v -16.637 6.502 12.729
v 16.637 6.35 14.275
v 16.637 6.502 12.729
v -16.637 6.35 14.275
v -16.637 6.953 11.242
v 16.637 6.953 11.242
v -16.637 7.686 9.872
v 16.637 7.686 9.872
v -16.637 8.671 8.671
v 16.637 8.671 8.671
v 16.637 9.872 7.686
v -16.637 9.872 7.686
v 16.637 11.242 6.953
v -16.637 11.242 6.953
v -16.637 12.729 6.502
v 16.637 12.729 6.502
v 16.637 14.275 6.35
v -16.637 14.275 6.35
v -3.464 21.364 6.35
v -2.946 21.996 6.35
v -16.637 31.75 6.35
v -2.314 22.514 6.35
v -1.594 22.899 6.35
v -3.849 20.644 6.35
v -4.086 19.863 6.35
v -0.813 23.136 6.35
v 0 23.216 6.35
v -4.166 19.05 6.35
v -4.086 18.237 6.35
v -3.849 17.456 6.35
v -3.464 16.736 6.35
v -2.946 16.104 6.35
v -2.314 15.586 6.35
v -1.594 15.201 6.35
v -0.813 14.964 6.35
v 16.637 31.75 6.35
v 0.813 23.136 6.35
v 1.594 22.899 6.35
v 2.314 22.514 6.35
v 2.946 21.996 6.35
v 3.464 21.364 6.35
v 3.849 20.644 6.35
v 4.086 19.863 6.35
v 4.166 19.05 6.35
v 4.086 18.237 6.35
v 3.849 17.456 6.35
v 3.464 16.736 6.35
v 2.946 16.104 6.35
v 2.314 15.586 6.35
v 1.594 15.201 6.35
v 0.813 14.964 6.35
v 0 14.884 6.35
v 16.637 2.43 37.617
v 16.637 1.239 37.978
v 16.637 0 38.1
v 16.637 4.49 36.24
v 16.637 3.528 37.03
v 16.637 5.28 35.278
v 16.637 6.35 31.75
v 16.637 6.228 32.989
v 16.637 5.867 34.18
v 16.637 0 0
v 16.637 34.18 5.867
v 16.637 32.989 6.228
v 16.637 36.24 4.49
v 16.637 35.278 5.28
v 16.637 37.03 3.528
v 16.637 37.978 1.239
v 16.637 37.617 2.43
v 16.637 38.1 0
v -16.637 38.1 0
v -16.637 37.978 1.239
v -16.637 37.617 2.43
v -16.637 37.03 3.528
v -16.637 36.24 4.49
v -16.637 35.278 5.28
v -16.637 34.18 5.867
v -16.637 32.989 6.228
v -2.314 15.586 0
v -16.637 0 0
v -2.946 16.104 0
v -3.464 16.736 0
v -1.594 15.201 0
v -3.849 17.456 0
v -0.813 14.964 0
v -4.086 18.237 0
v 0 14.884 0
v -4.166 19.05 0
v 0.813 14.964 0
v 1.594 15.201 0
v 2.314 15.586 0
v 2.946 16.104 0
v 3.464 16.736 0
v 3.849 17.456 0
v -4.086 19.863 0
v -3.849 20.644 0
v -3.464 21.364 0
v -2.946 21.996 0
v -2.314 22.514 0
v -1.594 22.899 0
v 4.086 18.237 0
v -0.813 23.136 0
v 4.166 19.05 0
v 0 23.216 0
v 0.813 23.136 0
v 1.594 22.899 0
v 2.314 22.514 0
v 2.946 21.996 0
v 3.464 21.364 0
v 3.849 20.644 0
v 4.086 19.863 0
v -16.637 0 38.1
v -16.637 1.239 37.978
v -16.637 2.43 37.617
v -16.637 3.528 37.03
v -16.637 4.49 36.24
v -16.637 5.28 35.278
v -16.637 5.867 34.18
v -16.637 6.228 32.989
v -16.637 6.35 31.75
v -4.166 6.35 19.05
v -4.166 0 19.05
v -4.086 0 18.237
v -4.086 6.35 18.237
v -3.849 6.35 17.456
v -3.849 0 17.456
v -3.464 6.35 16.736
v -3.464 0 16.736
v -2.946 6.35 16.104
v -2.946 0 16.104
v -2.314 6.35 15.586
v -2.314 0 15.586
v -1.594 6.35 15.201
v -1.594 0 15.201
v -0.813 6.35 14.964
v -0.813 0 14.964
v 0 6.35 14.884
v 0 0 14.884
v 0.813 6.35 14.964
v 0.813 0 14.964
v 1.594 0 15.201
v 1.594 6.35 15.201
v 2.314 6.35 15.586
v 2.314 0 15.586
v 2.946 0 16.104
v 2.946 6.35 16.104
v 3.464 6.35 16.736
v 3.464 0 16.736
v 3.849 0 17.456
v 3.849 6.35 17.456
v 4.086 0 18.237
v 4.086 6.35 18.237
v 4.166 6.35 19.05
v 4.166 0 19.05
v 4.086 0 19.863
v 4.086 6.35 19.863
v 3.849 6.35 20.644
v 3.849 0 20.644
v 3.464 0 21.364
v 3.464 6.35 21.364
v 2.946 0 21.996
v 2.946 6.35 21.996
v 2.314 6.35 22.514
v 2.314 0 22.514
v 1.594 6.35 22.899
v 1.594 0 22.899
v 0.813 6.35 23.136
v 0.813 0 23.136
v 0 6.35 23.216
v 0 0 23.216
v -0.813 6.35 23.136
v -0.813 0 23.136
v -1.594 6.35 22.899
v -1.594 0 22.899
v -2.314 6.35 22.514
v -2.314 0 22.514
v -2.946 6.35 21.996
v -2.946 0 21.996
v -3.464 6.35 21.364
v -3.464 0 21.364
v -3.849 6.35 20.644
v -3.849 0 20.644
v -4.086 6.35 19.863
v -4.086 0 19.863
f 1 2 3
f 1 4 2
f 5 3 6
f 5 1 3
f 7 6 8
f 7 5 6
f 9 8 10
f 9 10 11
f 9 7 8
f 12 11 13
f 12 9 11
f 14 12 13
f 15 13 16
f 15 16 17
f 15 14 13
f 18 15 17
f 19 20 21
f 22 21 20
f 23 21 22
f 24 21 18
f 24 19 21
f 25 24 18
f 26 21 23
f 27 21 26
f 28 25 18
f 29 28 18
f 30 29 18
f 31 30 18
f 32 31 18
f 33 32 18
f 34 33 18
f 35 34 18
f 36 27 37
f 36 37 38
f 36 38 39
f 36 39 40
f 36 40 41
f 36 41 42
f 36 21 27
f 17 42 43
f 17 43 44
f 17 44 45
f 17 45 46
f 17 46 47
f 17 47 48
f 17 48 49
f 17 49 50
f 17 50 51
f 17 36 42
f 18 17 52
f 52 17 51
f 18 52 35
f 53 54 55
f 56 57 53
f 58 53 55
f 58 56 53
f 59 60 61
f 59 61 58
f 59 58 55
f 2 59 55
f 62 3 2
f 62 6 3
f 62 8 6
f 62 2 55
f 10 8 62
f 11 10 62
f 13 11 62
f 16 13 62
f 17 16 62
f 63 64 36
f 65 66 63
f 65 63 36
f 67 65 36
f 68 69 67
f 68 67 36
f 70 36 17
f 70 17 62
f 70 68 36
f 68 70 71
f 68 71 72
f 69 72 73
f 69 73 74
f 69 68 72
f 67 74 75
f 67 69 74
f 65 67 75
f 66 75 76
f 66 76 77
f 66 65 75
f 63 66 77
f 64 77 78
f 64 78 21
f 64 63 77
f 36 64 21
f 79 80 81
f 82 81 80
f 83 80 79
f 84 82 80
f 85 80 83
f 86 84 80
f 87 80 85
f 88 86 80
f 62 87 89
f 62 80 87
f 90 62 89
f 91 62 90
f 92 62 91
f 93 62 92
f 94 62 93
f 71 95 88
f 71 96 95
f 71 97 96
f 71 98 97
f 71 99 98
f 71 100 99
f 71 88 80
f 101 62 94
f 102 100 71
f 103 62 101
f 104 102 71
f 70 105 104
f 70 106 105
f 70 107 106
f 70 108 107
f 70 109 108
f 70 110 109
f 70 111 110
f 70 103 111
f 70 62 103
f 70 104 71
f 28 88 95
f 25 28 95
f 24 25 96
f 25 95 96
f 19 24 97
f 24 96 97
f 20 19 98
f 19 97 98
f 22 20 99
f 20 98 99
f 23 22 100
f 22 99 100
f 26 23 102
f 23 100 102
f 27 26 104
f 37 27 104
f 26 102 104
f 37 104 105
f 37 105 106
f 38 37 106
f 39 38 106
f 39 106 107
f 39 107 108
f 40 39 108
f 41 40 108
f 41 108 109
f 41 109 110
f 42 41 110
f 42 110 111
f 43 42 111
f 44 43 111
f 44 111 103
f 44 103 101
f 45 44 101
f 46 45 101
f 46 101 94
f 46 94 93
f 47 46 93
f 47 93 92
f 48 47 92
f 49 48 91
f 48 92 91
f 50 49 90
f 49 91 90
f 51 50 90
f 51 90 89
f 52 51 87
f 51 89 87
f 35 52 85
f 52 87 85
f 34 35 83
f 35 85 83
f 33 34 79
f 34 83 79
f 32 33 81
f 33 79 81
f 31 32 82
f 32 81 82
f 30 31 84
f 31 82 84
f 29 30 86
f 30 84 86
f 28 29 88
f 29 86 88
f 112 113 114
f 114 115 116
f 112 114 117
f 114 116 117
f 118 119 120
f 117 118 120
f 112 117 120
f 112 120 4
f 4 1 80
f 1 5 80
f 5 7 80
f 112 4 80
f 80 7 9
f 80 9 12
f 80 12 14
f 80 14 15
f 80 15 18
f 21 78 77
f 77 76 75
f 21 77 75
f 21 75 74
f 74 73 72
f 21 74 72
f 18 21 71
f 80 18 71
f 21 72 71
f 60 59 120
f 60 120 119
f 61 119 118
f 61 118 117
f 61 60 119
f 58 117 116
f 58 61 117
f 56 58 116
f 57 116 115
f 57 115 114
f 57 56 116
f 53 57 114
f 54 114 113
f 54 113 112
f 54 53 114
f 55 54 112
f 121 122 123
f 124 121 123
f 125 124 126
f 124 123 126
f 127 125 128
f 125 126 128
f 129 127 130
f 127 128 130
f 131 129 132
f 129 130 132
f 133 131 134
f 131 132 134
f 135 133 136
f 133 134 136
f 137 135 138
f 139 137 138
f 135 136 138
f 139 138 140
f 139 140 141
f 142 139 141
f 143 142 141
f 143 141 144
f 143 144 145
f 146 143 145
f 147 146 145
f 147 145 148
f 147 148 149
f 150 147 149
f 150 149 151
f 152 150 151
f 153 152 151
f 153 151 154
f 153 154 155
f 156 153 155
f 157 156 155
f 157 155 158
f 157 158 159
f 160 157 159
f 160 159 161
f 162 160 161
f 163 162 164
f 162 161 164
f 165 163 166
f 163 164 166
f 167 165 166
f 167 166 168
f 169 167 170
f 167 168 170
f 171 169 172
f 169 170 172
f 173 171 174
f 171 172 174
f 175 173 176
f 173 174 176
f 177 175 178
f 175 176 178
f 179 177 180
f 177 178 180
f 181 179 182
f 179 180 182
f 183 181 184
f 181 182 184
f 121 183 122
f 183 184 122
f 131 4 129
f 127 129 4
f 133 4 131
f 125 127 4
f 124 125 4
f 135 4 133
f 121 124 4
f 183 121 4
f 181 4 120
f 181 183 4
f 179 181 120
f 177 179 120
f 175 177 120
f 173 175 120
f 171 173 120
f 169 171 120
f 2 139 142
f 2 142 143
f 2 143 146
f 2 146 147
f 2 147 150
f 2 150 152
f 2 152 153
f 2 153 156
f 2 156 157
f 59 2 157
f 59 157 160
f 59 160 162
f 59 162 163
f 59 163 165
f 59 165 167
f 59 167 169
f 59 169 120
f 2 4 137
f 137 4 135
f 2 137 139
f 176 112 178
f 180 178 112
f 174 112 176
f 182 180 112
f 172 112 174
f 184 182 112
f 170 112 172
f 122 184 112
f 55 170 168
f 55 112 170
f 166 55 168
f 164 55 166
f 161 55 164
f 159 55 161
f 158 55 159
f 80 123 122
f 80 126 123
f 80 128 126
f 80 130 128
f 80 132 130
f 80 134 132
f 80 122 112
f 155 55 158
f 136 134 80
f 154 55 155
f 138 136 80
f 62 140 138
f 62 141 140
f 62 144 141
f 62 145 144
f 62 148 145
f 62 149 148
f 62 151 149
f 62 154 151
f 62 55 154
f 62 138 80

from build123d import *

# Parameters (mm, degrees)
BOSS_EXTRUDE1_DEPTH = 33.274
HOLE1_D             = 8.3312
HOLE1_DEPTH         = 6.35
HOLE2_D             = 8.3312
HOLE2_DEPTH         = 6.35
FILLET1_R           = 7.9248


with BuildPart() as part:
    # Sketch1 → Boss-Extrude1 (new body)
    with BuildSketch(Plane(origin=(16.637, 0, 0), x_dir=(0, 0, -1), z_dir=(1, 0, 0))):
        with BuildLine():
            Line((-38.1, 0), (0, 0))
            Line((0, 0), (0, 38.1))
            ThreePointArc((0, 38.1), (-4.490128061, 36.240128061), (-6.35, 31.75))
            Line((-6.35, 31.75), (-6.35, 6.35))
            Line((-6.35, 6.35), (-31.75, 6.35))
            ThreePointArc((-31.75, 6.35), (-36.240128061, 4.490128061), (-38.1, 0))
        make_face()
    extrude(amount=-BOSS_EXTRUDE1_DEPTH)

    # Hole1
    with Locations(Plane.XY.offset(6.35)):
        with Locations((0, 19.05)):
            Hole(HOLE1_D / 2, depth=HOLE1_DEPTH)

    # Hole2
    with Locations(Plane(origin=(0, 6.35, 0), x_dir=(1, 0, 0), z_dir=(0, 1, 0))):
        with Locations((0, -19.05)):
            Hole(HOLE2_D / 2, depth=HOLE2_DEPTH)

    # Fillet1
    fillet1_edges = [part.edges().sort_by_distance(p)[0] for p in [
        (0, 6.35, 6.35),
    ]]
    fillet(fillet1_edges, radius=FILLET1_R)


solid = part.part
